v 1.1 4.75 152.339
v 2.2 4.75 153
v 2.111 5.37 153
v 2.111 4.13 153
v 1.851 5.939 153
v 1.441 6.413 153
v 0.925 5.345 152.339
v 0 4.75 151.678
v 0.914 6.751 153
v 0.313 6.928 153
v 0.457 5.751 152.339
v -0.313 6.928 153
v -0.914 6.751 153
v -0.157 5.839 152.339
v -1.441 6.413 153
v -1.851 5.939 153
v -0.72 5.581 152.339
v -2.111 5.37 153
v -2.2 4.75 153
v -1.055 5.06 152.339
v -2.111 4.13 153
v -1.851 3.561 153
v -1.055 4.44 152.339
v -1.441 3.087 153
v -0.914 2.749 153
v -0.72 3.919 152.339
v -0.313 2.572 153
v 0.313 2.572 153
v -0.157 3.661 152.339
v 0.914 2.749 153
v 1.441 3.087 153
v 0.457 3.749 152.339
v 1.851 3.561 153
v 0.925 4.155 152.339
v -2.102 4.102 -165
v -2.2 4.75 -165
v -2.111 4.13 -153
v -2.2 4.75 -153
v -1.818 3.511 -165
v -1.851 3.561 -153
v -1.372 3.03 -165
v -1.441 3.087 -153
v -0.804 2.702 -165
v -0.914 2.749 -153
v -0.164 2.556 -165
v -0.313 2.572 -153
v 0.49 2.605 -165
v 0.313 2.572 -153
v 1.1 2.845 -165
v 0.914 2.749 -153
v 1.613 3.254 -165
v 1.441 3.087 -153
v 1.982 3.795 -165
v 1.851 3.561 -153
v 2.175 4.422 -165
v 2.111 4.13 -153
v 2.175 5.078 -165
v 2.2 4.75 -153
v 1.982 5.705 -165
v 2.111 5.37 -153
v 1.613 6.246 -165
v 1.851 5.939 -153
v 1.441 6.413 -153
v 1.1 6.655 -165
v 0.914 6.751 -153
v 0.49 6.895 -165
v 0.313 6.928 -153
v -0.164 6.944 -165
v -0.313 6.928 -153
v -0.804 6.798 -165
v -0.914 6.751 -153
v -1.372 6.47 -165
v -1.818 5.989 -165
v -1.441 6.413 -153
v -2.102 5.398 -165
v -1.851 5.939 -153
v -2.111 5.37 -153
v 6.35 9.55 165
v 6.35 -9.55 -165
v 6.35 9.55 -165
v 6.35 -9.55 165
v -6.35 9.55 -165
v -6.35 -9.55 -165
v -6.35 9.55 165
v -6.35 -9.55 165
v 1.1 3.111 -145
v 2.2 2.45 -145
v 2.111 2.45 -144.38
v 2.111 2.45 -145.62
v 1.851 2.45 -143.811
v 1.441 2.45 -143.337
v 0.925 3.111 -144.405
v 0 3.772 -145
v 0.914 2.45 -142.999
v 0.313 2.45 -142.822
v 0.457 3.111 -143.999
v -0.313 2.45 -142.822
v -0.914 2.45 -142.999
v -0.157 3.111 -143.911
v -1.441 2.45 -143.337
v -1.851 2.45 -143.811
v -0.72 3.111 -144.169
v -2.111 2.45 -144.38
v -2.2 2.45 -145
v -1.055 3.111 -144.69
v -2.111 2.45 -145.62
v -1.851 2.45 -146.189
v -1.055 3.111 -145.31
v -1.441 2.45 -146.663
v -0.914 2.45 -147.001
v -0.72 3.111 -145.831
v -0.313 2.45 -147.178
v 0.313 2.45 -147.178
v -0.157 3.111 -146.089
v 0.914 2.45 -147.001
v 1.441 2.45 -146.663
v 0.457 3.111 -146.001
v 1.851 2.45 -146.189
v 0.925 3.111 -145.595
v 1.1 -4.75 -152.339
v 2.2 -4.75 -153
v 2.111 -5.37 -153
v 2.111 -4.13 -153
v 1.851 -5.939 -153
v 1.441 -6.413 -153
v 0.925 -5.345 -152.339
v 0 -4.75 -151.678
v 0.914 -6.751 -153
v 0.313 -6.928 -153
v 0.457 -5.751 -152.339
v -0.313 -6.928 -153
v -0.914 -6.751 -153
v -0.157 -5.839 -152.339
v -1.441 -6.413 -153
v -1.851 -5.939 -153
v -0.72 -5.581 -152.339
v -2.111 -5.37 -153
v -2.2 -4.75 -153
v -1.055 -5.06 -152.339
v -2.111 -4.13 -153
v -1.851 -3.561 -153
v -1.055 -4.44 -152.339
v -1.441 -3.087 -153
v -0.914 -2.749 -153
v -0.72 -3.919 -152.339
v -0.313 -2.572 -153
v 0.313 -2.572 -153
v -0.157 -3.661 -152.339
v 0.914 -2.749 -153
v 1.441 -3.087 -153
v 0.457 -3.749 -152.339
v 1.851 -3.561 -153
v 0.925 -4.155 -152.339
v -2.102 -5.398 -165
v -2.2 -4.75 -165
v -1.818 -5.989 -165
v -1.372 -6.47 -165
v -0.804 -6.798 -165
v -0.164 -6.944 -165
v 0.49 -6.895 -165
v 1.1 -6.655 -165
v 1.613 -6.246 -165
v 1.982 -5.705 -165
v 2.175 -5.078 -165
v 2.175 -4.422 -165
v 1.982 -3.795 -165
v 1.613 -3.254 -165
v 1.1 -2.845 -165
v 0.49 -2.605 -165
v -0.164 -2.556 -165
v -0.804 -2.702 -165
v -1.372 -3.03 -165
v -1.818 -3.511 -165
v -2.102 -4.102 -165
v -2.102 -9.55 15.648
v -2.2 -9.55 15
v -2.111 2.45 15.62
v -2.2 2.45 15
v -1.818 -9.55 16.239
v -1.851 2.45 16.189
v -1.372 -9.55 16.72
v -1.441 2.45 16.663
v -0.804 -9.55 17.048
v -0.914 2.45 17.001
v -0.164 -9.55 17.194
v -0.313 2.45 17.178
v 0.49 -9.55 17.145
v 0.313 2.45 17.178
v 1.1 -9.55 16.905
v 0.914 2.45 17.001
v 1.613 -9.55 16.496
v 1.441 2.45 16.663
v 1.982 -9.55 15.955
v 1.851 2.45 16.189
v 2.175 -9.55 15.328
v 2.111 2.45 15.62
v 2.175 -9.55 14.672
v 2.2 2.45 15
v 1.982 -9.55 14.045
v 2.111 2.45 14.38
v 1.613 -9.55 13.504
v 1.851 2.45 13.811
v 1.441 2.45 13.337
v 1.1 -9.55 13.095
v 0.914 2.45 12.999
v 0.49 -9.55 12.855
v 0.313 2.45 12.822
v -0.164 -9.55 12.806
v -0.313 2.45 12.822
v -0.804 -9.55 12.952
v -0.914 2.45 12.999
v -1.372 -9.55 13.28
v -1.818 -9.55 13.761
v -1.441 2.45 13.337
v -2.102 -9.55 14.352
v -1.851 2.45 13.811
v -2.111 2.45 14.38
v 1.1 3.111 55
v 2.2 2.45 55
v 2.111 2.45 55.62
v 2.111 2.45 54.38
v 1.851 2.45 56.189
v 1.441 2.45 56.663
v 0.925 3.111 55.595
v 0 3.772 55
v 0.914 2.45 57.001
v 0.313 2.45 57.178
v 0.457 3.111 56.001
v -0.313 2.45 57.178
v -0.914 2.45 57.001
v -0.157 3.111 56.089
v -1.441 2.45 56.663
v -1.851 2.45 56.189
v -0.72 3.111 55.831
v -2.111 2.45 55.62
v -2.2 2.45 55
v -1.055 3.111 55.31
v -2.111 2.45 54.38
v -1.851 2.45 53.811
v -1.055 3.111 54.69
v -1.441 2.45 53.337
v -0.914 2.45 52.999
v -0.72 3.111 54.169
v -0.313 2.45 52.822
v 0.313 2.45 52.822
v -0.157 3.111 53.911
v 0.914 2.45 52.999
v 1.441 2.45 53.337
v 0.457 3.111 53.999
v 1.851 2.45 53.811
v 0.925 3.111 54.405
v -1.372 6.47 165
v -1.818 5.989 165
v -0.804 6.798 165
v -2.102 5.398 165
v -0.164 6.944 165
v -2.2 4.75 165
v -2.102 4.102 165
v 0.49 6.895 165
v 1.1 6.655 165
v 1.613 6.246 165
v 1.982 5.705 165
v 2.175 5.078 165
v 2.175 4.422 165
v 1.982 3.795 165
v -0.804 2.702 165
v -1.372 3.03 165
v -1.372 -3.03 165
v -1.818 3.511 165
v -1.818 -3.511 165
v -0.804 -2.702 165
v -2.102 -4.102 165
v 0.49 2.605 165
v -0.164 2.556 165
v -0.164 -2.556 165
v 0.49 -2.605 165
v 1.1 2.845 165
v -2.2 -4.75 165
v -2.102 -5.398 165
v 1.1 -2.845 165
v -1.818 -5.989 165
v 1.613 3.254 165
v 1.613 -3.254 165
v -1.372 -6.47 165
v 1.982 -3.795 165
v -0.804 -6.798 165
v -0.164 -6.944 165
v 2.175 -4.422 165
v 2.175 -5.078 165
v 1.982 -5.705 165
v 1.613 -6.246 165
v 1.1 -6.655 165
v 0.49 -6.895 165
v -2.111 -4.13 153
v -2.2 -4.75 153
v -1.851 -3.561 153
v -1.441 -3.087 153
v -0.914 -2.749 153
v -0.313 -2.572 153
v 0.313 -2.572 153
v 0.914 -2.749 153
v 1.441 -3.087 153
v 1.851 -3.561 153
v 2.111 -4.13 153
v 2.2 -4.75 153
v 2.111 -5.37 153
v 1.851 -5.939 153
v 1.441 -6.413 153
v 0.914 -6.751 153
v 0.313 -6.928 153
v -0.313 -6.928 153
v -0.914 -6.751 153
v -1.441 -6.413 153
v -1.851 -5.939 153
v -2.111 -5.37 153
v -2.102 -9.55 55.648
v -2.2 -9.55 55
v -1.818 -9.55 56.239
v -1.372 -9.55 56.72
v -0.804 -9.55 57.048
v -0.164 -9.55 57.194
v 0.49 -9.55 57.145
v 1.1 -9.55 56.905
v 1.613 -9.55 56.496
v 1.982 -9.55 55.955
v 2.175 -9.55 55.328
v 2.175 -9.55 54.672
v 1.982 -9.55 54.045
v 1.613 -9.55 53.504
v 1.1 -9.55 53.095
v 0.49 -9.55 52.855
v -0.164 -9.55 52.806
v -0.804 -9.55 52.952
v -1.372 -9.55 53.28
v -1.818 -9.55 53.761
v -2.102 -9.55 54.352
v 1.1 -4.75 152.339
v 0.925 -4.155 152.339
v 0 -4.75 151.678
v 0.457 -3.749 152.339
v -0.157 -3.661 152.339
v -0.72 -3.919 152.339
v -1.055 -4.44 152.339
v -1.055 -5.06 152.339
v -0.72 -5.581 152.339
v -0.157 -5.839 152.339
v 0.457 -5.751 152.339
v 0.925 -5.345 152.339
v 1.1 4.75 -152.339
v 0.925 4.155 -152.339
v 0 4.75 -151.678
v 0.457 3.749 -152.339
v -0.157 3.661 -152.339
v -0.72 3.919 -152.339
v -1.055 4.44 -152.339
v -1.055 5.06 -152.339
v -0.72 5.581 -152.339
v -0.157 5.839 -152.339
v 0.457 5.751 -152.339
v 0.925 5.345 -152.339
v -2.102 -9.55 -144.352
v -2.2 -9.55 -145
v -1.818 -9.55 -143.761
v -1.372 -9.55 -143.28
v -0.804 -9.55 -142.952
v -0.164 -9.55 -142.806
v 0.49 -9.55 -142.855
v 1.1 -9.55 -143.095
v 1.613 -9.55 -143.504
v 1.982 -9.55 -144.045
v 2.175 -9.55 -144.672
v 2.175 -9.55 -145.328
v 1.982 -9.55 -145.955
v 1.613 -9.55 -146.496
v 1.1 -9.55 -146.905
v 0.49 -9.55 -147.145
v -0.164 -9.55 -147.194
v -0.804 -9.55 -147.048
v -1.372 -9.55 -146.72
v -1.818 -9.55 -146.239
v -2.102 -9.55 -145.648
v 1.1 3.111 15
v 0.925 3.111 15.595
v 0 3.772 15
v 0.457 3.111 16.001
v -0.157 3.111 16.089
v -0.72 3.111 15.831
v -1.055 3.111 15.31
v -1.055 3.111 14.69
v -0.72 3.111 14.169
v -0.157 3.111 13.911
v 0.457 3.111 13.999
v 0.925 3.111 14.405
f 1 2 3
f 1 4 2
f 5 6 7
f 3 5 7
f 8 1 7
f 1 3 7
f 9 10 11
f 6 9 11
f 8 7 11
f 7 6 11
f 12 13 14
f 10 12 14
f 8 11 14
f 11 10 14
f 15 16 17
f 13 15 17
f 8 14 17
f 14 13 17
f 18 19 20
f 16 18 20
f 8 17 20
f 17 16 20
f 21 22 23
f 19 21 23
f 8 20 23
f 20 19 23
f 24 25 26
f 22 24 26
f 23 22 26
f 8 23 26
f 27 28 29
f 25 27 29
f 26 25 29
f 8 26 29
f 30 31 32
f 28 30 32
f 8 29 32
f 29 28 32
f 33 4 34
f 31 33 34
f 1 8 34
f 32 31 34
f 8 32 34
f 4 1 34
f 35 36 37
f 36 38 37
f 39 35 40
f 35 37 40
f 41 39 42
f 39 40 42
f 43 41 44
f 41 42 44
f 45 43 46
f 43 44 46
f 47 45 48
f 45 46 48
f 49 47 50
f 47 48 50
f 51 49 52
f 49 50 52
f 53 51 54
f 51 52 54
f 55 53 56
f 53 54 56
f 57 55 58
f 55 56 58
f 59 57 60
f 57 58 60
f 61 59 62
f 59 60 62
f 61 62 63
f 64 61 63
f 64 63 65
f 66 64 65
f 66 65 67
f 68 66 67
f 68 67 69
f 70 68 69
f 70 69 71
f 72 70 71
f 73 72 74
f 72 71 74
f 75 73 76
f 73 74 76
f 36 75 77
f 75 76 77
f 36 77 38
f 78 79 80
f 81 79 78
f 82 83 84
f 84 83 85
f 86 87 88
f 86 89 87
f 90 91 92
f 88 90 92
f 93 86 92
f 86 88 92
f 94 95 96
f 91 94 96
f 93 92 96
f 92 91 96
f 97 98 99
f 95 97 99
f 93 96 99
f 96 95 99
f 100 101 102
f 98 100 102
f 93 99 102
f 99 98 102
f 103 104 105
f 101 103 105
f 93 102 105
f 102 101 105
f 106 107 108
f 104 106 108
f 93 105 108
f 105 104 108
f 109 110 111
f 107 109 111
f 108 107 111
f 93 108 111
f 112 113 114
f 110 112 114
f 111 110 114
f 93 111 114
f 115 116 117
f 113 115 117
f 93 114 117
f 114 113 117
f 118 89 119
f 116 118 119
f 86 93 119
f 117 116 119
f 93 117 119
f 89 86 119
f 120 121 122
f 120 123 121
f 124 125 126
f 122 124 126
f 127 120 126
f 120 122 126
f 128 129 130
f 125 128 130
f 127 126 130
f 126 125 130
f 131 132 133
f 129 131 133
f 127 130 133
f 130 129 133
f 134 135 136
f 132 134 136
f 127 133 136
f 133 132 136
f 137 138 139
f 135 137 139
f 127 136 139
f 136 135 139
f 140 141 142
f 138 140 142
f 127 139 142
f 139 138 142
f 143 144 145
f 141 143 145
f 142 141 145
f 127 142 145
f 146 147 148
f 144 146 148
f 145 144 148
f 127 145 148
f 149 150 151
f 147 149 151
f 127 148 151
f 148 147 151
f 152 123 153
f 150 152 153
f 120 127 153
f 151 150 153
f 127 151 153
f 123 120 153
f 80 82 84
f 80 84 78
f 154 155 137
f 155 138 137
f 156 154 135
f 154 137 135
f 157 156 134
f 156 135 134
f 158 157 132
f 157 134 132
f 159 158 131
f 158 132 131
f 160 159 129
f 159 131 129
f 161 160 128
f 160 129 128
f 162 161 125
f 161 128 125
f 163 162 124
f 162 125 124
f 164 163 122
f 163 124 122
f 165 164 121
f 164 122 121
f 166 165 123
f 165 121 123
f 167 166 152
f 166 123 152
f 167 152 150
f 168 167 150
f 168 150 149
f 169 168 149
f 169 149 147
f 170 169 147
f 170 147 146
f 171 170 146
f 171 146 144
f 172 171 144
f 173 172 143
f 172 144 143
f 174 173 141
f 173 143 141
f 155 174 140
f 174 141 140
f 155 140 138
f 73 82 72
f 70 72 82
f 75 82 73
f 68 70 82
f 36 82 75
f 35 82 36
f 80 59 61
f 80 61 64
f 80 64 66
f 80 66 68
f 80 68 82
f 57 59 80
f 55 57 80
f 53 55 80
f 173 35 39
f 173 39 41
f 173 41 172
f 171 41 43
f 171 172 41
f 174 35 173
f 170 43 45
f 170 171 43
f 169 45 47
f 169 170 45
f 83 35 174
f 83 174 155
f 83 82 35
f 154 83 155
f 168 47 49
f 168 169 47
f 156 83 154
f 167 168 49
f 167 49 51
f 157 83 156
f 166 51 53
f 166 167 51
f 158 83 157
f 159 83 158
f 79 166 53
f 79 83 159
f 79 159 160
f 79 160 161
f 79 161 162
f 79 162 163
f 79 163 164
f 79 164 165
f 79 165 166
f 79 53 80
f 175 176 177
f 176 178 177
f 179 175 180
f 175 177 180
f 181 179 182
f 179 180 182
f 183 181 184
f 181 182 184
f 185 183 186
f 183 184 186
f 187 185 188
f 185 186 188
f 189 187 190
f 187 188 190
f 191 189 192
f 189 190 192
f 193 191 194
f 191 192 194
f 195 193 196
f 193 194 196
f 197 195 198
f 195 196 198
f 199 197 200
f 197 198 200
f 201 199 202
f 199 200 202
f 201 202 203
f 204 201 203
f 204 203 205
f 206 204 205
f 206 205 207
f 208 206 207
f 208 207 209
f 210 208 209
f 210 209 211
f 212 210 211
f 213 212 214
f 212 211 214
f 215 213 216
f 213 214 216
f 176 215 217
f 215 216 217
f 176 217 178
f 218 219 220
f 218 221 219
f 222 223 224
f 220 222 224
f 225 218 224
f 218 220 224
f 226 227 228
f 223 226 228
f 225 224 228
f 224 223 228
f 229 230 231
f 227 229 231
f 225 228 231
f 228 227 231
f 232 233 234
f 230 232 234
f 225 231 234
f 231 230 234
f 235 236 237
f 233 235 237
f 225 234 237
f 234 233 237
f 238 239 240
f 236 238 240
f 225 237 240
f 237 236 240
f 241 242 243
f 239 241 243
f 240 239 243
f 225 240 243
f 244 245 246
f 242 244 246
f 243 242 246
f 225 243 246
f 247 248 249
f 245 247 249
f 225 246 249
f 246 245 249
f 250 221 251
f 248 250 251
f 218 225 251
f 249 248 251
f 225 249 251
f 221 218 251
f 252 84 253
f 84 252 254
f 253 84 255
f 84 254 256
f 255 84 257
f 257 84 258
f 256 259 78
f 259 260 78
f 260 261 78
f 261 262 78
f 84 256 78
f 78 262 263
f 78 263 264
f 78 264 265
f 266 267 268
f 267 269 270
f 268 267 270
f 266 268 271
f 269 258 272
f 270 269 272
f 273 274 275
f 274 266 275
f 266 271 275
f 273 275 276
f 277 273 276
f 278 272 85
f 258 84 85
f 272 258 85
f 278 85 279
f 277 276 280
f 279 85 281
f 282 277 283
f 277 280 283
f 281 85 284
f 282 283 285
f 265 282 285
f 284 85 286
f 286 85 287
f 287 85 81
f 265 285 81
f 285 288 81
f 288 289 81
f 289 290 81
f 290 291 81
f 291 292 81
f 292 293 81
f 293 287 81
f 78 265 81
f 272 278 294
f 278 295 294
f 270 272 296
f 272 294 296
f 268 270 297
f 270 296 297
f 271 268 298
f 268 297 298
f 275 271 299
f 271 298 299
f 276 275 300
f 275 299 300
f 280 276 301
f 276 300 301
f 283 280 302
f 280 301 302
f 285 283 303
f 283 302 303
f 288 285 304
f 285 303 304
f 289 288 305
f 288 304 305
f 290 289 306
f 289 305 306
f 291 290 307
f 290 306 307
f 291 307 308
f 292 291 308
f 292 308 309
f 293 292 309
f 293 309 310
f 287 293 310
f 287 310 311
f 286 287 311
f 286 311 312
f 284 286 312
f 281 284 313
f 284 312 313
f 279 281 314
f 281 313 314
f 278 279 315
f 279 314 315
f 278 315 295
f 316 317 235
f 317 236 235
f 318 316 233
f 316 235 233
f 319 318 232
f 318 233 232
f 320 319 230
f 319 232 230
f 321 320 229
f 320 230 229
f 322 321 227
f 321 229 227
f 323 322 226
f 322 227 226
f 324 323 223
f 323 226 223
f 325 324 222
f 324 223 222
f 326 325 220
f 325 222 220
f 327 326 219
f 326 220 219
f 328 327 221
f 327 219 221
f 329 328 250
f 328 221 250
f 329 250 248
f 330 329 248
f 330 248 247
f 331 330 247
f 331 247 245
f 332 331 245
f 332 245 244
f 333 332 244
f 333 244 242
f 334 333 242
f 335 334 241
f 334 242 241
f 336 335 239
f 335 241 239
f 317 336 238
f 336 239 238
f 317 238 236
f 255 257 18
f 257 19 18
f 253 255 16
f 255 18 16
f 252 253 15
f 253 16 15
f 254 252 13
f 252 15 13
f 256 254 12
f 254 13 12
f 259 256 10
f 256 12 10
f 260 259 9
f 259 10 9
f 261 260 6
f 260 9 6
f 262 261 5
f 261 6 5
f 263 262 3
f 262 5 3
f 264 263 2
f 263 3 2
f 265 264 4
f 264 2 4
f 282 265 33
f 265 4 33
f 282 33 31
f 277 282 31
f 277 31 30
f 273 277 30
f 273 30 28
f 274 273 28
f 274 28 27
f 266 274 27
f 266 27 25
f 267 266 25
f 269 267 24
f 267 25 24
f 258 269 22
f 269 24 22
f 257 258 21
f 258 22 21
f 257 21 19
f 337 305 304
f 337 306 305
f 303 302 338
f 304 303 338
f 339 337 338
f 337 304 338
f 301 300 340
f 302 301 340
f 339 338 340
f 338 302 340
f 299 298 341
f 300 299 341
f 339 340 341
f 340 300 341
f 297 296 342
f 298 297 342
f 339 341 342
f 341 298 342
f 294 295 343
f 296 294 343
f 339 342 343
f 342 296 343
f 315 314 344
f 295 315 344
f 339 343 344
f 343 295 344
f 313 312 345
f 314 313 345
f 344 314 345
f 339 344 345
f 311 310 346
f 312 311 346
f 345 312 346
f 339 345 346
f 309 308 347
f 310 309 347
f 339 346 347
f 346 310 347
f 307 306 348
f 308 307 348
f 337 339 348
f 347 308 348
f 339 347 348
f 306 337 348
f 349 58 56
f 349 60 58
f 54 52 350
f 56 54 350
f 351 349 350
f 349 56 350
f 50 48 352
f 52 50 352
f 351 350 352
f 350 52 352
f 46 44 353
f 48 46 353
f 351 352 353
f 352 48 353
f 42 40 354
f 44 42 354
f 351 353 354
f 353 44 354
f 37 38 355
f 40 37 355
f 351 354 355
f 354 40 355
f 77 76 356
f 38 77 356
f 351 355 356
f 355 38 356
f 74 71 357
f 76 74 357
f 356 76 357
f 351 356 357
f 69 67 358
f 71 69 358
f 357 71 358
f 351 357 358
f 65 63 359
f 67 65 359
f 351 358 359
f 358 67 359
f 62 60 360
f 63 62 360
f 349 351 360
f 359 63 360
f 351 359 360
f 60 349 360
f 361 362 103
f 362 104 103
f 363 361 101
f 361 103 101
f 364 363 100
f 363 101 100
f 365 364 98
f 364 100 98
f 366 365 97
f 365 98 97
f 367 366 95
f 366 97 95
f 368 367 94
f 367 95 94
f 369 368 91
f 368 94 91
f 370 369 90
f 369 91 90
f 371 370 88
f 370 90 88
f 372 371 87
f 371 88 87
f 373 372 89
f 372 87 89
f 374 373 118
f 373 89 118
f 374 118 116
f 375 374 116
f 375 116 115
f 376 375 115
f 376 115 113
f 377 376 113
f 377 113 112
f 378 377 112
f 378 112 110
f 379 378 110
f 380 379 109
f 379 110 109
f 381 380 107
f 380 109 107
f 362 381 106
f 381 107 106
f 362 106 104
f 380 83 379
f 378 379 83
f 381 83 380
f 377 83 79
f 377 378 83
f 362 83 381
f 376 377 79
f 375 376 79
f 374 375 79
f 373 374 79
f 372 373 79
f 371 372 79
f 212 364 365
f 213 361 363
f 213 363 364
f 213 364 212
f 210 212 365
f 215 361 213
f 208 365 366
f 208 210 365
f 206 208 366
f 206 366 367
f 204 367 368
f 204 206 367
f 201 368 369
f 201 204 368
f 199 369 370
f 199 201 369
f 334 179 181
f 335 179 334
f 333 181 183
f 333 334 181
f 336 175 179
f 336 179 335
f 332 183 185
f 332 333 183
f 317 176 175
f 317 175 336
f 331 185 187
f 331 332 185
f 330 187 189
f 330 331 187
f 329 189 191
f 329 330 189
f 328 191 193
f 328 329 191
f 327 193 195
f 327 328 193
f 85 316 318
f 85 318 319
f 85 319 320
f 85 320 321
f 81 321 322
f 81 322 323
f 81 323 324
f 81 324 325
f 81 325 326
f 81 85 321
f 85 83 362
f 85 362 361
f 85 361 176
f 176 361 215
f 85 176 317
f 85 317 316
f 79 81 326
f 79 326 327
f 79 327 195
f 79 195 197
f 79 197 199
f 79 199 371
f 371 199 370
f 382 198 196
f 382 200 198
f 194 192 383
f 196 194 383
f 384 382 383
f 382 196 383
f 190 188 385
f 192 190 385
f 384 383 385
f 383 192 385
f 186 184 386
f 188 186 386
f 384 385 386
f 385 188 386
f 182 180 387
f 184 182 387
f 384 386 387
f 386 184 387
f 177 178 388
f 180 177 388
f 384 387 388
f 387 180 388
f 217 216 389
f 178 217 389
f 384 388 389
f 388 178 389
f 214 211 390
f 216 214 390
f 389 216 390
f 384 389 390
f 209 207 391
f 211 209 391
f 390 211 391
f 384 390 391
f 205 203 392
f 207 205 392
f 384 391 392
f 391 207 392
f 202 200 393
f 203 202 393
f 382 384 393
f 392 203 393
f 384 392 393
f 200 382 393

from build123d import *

# Parameters (mm, degrees)
F0_W           = 12.7
F0_H           = 330
F1_DEPTH       = 9.55
F3_D           = 4.4
F3_DEPTH       = 12
F3_TIP         = 1.3218933619
F6_D           = 4.4
F6_DEPTH       = 12
F6_TIP         = 1.3218933619
F6_ON_F4_D     = 4.4
F6_ON_F4_DEPTH = 12
F6_ON_F4_TIP   = 1.3218933619


with BuildPart() as f1:
    # F0 (on Front) → F1 (new body, symmetric)
    with BuildSketch(Plane.XZ):
        Rectangle(F0_W, F0_H)
    extrude(amount=F1_DEPTH, both=True)

    # F3
    with Locations(Plane.XZ.offset(9.55)):
        with Locations((0, 15), (0, -145), (0, 55), (0, 55)):
            Hole(F3_D / 2, depth=F3_DEPTH)
            with Locations((0, 0, -(F3_DEPTH + F3_TIP / 2))):  # 118° drill point
                Cone(0, F3_D / 2, F3_TIP, mode=Mode.SUBTRACT)

    # F6
    with Locations(Plane.XY.offset(165)):
        with Locations((0, 4.75), (0, -4.75)):
            Hole(F6_D / 2, depth=F6_DEPTH)
            with Locations((0, 0, -(F6_DEPTH + F6_TIP / 2))):  # 118° drill point
                Cone(0, F6_D / 2, F6_TIP, mode=Mode.SUBTRACT)

    # F6 on F4
    with Locations(Plane(origin=(0, 0, -165), x_dir=(1, 0, 0), z_dir=(0, 0, -1))):
        with Locations((0, 4.75), (0, -4.75)):
            Hole(F6_ON_F4_D / 2, depth=F6_ON_F4_DEPTH)
            with Locations((0, 0, -(F6_ON_F4_DEPTH + F6_ON_F4_TIP / 2))):  # 118° drill point
                Cone(0, F6_ON_F4_D / 2, F6_ON_F4_TIP, mode=Mode.SUBTRACT)


solid = f1.part
